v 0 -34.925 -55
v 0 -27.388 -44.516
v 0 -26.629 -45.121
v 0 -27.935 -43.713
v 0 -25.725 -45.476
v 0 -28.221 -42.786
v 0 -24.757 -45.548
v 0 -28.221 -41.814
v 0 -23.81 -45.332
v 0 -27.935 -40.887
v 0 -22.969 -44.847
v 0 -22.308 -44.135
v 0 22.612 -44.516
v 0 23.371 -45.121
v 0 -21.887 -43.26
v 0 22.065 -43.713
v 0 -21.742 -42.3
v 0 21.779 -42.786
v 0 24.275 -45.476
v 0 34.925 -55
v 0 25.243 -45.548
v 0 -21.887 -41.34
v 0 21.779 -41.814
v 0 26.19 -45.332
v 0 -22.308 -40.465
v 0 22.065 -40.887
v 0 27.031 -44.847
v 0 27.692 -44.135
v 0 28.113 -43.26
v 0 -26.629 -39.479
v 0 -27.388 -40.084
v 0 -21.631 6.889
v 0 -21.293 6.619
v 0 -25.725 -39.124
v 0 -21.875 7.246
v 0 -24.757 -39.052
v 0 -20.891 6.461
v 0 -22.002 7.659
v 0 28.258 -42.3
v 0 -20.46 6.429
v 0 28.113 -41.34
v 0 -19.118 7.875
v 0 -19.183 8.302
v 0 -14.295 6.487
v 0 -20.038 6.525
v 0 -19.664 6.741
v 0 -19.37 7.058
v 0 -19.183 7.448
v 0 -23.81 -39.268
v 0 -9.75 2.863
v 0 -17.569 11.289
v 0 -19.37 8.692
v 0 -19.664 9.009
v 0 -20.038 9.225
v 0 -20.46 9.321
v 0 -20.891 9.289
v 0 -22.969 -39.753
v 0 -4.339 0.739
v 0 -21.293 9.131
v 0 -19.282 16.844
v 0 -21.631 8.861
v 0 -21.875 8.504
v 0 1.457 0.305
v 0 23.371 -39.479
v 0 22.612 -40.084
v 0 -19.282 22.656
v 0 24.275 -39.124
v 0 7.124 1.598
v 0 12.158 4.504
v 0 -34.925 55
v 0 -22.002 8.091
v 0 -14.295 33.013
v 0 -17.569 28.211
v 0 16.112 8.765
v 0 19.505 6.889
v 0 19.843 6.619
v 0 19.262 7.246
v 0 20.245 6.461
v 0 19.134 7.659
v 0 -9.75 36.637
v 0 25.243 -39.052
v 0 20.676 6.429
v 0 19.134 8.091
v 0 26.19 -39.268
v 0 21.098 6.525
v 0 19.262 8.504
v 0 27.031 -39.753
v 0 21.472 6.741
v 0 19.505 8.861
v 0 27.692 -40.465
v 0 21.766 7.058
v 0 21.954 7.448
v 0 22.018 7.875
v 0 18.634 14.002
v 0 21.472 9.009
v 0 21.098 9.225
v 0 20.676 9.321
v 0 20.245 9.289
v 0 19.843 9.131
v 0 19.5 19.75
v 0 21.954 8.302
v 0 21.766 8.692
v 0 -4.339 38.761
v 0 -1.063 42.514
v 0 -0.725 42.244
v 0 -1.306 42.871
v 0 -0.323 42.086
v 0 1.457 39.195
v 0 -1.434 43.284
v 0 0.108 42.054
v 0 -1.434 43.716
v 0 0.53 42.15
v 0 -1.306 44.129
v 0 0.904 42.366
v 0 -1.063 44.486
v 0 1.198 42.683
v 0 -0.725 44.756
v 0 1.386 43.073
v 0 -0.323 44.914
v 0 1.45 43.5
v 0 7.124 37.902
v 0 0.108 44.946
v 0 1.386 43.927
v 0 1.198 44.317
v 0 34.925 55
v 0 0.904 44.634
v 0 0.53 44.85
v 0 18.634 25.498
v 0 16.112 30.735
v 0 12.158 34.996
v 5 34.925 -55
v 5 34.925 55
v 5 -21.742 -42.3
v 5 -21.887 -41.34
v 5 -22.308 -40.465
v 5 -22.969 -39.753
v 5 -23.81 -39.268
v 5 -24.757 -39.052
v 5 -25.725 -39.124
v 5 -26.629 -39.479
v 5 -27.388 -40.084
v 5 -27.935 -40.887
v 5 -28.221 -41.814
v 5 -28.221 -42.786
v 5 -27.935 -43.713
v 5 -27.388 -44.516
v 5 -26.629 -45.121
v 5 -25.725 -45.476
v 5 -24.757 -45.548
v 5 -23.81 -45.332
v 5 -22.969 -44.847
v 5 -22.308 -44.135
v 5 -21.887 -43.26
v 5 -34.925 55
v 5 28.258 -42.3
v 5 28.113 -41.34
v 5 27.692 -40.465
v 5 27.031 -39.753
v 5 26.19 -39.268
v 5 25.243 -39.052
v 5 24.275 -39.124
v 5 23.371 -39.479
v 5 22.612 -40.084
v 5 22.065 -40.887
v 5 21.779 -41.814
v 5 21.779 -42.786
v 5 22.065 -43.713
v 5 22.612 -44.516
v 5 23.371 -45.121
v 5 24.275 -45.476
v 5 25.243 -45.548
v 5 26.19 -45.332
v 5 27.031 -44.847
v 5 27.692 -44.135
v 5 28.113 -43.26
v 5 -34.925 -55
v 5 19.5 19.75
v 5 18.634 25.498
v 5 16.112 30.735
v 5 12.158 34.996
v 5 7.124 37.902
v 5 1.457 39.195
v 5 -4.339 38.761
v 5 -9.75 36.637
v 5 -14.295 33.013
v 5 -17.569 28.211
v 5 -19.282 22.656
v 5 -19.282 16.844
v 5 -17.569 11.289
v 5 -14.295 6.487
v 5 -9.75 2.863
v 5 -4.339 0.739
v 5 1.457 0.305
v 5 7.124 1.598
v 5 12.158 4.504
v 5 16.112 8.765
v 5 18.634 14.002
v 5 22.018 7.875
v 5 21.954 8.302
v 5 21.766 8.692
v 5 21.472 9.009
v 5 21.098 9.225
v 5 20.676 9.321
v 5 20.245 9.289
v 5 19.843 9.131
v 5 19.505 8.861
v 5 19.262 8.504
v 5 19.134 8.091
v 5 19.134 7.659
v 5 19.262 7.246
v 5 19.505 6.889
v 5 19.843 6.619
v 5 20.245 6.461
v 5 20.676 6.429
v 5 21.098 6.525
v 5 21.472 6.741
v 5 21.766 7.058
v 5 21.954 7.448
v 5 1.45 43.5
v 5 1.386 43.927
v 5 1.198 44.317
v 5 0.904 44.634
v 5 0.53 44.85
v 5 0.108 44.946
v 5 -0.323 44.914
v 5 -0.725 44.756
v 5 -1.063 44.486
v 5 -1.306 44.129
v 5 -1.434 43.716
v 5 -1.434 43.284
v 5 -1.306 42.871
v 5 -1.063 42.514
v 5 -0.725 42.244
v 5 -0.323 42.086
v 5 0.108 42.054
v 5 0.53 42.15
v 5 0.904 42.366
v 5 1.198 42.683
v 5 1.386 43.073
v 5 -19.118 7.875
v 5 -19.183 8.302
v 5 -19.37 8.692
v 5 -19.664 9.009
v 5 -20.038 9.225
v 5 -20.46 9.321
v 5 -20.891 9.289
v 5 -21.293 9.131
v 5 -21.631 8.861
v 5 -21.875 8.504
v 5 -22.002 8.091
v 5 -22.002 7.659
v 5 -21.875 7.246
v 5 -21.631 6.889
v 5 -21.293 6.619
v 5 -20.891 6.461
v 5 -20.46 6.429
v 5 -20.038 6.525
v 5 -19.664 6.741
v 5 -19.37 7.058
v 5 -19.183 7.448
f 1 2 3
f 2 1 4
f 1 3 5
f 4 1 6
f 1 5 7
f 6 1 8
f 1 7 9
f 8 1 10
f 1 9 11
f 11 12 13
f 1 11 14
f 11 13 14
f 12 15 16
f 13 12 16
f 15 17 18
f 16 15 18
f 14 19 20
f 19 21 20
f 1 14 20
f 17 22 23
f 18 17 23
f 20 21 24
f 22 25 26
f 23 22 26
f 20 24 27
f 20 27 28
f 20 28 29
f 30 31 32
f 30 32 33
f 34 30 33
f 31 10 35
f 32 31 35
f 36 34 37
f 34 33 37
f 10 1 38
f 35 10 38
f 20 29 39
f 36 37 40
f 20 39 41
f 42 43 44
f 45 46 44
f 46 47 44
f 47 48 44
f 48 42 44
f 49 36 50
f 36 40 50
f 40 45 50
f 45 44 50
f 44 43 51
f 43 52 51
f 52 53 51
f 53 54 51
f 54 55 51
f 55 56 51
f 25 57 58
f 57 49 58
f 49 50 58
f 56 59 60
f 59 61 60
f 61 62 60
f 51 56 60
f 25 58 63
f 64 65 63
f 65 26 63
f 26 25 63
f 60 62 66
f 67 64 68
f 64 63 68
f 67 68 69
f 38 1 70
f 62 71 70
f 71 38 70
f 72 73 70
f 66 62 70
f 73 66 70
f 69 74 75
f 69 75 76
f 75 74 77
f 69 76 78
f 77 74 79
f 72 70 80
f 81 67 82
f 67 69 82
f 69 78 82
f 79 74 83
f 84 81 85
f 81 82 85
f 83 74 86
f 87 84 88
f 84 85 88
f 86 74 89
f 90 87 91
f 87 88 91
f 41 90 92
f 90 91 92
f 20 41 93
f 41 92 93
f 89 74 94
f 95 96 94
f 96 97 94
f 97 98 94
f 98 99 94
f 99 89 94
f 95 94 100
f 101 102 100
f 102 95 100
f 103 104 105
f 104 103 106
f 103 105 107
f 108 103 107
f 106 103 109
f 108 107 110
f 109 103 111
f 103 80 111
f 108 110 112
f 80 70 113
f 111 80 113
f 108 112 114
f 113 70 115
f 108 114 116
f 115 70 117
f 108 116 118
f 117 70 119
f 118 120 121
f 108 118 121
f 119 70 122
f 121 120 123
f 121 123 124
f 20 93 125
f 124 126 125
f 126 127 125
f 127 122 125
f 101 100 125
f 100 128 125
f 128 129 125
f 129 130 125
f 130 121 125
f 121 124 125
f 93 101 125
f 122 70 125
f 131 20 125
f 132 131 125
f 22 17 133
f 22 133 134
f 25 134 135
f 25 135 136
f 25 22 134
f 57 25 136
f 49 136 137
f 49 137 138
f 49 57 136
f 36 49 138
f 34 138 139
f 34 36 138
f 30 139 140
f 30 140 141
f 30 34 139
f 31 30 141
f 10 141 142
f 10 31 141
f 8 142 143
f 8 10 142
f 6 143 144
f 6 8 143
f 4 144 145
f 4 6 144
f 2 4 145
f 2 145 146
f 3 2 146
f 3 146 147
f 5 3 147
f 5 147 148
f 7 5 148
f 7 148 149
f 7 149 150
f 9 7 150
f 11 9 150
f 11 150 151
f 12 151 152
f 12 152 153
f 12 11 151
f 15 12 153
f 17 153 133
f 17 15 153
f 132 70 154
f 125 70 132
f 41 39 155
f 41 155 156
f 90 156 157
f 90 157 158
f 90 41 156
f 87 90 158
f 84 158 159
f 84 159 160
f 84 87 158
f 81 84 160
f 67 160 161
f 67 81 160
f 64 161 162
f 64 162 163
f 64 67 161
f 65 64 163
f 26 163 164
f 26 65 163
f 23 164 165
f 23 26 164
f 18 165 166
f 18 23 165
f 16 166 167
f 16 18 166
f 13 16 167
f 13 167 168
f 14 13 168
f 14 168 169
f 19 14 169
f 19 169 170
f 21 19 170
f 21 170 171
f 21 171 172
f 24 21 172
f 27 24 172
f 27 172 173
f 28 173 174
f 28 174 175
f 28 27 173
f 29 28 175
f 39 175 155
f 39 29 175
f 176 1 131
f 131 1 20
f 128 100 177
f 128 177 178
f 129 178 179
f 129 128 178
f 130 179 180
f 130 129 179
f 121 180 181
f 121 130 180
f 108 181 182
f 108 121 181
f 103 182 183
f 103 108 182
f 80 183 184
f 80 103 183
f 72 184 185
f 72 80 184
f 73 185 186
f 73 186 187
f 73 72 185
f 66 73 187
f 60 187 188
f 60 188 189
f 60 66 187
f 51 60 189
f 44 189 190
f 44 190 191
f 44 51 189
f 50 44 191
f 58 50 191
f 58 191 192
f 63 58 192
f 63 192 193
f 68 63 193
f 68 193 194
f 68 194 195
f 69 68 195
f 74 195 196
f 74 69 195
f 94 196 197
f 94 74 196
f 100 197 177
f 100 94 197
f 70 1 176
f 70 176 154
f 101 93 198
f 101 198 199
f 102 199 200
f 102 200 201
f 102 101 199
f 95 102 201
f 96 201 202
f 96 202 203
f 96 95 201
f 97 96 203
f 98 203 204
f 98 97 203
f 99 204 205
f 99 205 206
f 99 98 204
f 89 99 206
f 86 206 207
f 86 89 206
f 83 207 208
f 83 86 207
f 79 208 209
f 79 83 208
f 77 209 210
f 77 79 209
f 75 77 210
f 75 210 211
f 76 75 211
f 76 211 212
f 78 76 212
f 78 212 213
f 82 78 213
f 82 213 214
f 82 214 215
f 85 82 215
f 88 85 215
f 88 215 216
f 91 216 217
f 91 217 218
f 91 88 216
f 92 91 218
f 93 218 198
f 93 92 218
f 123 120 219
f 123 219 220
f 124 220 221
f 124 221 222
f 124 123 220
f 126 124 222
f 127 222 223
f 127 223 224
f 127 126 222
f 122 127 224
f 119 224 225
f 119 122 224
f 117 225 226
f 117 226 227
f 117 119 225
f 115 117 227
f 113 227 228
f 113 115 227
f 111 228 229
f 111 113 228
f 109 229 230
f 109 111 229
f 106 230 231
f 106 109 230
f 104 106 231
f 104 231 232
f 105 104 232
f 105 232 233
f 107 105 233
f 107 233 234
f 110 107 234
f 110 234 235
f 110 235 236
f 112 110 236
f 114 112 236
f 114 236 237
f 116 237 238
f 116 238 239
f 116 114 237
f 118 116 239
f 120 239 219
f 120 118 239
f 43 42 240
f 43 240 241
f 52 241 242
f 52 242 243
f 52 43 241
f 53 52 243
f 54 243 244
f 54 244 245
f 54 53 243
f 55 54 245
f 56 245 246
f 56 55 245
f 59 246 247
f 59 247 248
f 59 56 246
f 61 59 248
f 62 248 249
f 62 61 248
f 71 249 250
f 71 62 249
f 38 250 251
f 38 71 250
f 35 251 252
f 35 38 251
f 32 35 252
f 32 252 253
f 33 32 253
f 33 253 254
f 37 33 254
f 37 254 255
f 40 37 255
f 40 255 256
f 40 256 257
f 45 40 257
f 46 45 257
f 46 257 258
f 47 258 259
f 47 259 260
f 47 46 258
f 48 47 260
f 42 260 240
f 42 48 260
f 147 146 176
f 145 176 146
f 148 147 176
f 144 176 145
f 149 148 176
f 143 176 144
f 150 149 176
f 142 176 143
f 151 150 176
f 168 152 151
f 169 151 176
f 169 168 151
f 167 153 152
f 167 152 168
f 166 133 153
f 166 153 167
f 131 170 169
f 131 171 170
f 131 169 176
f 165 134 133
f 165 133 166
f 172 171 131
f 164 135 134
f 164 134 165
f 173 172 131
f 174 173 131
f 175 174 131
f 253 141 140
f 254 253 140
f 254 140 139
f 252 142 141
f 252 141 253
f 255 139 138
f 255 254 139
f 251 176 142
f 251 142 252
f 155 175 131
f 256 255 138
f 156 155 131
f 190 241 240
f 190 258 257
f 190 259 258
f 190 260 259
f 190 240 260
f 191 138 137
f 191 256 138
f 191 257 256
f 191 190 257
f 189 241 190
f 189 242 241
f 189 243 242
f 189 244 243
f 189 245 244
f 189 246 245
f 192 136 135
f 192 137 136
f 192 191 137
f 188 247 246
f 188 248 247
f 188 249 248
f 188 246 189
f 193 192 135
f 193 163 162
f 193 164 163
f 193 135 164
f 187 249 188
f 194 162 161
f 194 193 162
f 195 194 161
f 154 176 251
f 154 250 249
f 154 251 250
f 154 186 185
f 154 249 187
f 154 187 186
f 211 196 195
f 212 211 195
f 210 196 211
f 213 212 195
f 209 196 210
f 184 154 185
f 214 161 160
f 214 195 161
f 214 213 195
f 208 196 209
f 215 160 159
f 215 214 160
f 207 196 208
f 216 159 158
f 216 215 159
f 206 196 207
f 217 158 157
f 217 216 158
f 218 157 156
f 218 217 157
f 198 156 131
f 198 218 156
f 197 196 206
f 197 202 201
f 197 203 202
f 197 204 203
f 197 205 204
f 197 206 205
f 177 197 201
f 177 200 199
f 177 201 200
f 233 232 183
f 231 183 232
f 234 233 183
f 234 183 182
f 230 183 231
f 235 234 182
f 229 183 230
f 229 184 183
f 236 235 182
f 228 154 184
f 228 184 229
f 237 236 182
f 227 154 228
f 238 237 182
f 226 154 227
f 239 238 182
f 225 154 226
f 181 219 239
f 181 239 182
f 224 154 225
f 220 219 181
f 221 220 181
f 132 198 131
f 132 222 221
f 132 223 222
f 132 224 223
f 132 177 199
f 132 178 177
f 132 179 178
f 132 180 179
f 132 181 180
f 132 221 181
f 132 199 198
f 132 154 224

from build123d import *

# Parameters (mm, degrees)
SKETCH1_W           = 69.85
SKETCH1_H           = 110
SKETCH1_R           = 19.5
SKETCH1_R_2         = 3.25755
SKETCH1_R_3         = 1.45
BOSS_EXTRUDE1_DEPTH = 5


with BuildPart() as part:
    # Sketch1 → Boss-Extrude1 (new body)
    with BuildSketch(Plane.YZ):
        Rectangle(SKETCH1_W, SKETCH1_H)
        with Locations((0, 19.75)):
            Circle(SKETCH1_R, mode=Mode.SUBTRACT)
        with Locations((-25, -42.3)):
            Circle(SKETCH1_R_2, mode=Mode.SUBTRACT)
        with Locations((25, -42.3)):
            Circle(SKETCH1_R_2, mode=Mode.SUBTRACT)
        with Locations((-20.56810334, 7.875)):
            Circle(SKETCH1_R_3, mode=Mode.SUBTRACT)
        with Locations((20.56810334, 7.875)):
            Circle(SKETCH1_R_3, mode=Mode.SUBTRACT)
        with Locations((0, 43.5)):
            Circle(SKETCH1_R_3, mode=Mode.SUBTRACT)
    extrude(amount=BOSS_EXTRUDE1_DEPTH)


solid = part.part
